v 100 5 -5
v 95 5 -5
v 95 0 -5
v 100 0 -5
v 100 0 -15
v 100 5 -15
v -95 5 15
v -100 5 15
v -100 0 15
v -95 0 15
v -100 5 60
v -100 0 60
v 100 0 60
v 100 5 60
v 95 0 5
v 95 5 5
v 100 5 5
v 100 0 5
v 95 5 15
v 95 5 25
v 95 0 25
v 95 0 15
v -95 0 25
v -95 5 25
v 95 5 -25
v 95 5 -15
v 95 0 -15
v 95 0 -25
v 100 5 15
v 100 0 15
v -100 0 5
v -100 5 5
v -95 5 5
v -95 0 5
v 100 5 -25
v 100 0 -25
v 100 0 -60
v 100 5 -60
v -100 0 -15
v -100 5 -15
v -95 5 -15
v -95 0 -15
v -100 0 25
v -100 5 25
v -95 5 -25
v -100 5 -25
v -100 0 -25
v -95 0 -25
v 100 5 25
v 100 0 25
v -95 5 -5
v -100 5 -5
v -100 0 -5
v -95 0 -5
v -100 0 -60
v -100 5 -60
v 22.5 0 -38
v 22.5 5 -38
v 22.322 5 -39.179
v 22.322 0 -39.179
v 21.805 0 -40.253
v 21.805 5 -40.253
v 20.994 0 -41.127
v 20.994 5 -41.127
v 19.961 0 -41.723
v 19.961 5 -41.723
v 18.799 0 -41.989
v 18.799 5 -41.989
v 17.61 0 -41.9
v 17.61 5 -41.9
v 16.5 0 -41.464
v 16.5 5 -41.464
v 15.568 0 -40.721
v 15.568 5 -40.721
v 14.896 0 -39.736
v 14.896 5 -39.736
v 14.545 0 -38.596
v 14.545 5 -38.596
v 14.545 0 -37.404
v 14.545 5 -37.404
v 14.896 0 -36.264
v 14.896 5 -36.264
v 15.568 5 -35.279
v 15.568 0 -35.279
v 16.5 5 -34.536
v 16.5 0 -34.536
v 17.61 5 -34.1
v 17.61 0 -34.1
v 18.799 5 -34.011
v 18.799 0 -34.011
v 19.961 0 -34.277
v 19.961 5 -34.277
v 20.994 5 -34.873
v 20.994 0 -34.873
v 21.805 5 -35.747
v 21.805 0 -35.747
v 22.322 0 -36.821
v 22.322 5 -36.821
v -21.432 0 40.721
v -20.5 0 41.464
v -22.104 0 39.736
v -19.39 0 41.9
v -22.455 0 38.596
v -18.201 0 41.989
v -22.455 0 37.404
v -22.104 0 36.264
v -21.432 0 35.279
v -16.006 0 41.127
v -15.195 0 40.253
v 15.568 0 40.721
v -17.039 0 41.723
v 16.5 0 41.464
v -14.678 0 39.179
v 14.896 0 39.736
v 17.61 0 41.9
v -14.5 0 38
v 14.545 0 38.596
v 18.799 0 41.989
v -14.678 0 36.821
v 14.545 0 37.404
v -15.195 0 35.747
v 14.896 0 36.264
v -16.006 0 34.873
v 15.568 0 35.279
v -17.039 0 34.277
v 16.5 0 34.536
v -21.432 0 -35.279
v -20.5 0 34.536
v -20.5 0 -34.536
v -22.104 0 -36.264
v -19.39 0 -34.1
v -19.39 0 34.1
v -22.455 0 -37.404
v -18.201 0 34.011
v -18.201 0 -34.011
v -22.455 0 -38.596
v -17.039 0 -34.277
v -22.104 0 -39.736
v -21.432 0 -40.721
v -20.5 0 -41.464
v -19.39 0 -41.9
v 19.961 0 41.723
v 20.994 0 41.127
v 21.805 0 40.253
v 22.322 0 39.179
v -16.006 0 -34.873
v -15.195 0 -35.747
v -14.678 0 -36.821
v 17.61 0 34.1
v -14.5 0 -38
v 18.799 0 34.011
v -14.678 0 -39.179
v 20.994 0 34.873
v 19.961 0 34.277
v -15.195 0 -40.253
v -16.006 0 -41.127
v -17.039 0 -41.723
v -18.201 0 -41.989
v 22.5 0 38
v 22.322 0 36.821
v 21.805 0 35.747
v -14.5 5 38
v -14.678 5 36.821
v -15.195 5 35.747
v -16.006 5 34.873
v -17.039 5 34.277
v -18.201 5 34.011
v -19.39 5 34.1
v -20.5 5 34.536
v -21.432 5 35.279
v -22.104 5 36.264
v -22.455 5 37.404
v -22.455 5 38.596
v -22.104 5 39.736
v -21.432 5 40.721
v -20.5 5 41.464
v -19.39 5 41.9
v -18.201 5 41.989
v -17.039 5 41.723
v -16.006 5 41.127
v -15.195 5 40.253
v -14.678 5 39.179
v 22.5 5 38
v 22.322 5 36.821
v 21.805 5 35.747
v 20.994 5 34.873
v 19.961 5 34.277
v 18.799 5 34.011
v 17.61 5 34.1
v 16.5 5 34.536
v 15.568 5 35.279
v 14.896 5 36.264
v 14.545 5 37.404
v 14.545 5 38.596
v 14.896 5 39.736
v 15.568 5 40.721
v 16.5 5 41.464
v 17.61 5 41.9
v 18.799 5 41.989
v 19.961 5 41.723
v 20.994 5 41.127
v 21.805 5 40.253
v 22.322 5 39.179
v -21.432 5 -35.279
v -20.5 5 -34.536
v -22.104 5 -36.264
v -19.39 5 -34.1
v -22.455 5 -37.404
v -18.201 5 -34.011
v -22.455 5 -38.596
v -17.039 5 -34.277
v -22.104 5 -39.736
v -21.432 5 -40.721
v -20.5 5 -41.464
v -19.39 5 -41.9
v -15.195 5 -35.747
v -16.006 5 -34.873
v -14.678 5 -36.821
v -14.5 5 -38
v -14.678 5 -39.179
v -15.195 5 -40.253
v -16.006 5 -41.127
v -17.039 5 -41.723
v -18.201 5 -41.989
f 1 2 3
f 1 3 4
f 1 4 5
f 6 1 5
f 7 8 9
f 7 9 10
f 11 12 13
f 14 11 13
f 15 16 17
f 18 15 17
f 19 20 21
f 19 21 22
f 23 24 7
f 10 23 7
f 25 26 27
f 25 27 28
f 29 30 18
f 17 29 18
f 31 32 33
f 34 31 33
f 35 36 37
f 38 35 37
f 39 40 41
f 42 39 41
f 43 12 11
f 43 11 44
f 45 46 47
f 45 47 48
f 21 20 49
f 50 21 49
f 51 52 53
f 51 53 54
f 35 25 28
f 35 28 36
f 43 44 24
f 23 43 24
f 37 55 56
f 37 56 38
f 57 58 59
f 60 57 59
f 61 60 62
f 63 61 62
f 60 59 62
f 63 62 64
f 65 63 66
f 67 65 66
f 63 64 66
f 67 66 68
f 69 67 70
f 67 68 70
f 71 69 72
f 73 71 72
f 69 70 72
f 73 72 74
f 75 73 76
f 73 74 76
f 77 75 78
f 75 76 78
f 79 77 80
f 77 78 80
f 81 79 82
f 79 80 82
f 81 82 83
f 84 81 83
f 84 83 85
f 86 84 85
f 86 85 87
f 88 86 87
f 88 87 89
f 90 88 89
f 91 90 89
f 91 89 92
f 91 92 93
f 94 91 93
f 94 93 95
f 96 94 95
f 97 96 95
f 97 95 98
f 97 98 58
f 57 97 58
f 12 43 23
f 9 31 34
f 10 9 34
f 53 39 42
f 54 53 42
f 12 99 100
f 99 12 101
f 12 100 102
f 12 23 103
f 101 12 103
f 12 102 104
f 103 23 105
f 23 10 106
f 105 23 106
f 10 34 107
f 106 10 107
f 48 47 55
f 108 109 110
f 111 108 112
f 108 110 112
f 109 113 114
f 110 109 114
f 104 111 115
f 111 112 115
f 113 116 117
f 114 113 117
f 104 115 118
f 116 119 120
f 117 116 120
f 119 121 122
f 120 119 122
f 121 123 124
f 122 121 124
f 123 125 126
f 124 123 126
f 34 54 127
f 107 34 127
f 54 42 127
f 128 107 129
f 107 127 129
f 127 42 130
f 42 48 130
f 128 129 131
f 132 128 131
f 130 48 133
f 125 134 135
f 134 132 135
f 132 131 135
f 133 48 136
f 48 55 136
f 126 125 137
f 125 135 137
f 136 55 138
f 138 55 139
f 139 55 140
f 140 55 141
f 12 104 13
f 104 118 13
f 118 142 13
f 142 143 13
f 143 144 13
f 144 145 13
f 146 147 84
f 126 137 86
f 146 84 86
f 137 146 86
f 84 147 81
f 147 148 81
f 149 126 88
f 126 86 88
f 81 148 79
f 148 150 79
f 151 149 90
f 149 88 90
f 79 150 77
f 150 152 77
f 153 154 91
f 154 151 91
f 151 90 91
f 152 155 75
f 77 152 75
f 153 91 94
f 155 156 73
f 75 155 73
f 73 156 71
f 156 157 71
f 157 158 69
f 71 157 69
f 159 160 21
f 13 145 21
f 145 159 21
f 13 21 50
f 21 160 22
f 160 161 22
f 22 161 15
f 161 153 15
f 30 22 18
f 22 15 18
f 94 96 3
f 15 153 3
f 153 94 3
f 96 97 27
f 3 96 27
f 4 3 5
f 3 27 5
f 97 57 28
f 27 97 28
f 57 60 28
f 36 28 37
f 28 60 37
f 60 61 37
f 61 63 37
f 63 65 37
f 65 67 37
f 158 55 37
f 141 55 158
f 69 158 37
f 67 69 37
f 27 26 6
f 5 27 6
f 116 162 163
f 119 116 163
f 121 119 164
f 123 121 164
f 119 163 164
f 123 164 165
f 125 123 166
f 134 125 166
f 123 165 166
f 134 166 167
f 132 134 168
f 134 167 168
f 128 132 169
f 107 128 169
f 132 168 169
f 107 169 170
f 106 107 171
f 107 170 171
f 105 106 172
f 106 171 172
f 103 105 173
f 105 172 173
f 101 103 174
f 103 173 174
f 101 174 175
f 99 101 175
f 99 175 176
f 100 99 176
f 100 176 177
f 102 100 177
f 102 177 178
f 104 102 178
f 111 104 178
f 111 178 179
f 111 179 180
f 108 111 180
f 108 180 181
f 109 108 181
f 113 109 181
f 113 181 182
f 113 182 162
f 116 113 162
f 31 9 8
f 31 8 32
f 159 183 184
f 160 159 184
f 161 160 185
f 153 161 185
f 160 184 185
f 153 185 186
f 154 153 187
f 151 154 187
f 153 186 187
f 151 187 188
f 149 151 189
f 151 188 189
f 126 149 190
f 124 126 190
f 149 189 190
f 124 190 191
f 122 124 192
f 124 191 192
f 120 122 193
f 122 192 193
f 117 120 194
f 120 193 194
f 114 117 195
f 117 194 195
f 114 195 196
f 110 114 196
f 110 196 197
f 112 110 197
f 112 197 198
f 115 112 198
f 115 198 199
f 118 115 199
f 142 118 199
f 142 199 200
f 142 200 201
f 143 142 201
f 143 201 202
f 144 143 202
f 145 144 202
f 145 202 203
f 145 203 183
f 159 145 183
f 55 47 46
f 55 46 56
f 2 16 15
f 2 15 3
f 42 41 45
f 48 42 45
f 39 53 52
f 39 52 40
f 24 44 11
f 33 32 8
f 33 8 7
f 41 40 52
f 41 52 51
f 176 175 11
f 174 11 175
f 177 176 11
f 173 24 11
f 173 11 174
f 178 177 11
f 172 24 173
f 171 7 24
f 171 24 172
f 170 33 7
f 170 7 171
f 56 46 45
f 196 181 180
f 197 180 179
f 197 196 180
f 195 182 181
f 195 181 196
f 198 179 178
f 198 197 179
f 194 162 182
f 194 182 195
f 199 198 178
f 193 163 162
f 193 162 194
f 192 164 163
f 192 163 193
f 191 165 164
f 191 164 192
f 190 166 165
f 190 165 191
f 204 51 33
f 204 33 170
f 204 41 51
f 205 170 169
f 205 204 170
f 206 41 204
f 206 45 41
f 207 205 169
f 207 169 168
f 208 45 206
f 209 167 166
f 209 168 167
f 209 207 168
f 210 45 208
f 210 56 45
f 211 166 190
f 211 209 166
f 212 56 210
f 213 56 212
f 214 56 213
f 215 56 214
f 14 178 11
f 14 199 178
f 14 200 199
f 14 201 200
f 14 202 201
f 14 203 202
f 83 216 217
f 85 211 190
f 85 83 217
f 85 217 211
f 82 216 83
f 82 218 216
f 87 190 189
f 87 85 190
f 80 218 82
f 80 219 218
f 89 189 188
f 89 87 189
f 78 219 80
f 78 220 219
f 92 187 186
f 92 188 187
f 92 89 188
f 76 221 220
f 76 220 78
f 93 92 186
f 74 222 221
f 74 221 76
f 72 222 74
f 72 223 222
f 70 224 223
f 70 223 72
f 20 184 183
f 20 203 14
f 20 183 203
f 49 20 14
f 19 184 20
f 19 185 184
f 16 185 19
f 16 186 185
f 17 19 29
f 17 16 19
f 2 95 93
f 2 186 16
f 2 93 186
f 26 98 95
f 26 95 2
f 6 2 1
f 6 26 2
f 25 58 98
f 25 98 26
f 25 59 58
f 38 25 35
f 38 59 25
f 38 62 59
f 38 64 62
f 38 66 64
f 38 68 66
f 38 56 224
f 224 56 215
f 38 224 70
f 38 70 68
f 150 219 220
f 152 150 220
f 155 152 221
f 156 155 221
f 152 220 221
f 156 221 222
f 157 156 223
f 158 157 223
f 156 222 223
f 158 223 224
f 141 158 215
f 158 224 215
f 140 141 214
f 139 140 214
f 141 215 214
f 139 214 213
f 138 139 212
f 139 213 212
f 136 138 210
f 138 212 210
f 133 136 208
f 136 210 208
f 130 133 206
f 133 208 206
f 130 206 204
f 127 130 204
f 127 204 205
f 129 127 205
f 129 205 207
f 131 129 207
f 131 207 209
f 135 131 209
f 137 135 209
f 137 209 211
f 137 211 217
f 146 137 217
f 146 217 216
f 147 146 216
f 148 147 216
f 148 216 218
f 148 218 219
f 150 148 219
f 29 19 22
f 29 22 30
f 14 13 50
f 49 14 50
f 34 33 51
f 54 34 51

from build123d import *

# Parameters (mm, degrees)
SKETCH_1_W          = 200
SKETCH_1_H          = 120
EXTRUDE_1_DEPTH     = 5
SKETCH_2_W          = 5
SKETCH_2_H          = 10
CUT_EXTRUDE_1_DEPTH = 5
SKETCH_3_R          = 4
CUT_EXTRUDE_2_DEPTH = 6


with BuildPart() as part:
    # 草图1 → 凸台-拉伸1 (new body)
    with BuildSketch(Plane(origin=(0, 0, 0), x_dir=(1, 0, 0), z_dir=(0, 1, 0))):
        Rectangle(SKETCH_1_W, SKETCH_1_H)
    extrude(amount=EXTRUDE_1_DEPTH)

    # 草图2 → 切除-拉伸1 (cut)
    with BuildSketch(Plane(origin=(0, 5, 0), x_dir=(1, 0, 0), z_dir=(0, 1, 0))):
        with Locations((97.5, 0)):
            Rectangle(SKETCH_2_W, SKETCH_2_H)
        with Locations((-97.5, 0)):
            Rectangle(SKETCH_2_W, SKETCH_2_H)
        with Locations((-97.5, -20)):
            Rectangle(SKETCH_2_W, SKETCH_2_H)
        with Locations((-97.5, 20)):
            Rectangle(SKETCH_2_W, SKETCH_2_H)
        with Locations((97.5, -20)):
            Rectangle(SKETCH_2_W, SKETCH_2_H)
        with Locations((97.5, 20)):
            Rectangle(SKETCH_2_W, SKETCH_2_H)
    extrude(amount=-CUT_EXTRUDE_1_DEPTH, mode=Mode.SUBTRACT)

    # 草图3 → 切除-拉伸2 (cut, through all)
    with BuildSketch(Plane(origin=(0, 5, 0), x_dir=(1, 0, 0), z_dir=(0, 1, 0))):
        with Locations((-18.5, 38)):
            Circle(SKETCH_3_R)
        with Locations((18.5, 38)):
            Circle(SKETCH_3_R)
        with Locations((18.5, -38)):
            Circle(SKETCH_3_R)
        with Locations((-18.5, -38)):
            Circle(SKETCH_3_R)
    extrude(amount=-CUT_EXTRUDE_2_DEPTH, mode=Mode.SUBTRACT)


solid = part.part
